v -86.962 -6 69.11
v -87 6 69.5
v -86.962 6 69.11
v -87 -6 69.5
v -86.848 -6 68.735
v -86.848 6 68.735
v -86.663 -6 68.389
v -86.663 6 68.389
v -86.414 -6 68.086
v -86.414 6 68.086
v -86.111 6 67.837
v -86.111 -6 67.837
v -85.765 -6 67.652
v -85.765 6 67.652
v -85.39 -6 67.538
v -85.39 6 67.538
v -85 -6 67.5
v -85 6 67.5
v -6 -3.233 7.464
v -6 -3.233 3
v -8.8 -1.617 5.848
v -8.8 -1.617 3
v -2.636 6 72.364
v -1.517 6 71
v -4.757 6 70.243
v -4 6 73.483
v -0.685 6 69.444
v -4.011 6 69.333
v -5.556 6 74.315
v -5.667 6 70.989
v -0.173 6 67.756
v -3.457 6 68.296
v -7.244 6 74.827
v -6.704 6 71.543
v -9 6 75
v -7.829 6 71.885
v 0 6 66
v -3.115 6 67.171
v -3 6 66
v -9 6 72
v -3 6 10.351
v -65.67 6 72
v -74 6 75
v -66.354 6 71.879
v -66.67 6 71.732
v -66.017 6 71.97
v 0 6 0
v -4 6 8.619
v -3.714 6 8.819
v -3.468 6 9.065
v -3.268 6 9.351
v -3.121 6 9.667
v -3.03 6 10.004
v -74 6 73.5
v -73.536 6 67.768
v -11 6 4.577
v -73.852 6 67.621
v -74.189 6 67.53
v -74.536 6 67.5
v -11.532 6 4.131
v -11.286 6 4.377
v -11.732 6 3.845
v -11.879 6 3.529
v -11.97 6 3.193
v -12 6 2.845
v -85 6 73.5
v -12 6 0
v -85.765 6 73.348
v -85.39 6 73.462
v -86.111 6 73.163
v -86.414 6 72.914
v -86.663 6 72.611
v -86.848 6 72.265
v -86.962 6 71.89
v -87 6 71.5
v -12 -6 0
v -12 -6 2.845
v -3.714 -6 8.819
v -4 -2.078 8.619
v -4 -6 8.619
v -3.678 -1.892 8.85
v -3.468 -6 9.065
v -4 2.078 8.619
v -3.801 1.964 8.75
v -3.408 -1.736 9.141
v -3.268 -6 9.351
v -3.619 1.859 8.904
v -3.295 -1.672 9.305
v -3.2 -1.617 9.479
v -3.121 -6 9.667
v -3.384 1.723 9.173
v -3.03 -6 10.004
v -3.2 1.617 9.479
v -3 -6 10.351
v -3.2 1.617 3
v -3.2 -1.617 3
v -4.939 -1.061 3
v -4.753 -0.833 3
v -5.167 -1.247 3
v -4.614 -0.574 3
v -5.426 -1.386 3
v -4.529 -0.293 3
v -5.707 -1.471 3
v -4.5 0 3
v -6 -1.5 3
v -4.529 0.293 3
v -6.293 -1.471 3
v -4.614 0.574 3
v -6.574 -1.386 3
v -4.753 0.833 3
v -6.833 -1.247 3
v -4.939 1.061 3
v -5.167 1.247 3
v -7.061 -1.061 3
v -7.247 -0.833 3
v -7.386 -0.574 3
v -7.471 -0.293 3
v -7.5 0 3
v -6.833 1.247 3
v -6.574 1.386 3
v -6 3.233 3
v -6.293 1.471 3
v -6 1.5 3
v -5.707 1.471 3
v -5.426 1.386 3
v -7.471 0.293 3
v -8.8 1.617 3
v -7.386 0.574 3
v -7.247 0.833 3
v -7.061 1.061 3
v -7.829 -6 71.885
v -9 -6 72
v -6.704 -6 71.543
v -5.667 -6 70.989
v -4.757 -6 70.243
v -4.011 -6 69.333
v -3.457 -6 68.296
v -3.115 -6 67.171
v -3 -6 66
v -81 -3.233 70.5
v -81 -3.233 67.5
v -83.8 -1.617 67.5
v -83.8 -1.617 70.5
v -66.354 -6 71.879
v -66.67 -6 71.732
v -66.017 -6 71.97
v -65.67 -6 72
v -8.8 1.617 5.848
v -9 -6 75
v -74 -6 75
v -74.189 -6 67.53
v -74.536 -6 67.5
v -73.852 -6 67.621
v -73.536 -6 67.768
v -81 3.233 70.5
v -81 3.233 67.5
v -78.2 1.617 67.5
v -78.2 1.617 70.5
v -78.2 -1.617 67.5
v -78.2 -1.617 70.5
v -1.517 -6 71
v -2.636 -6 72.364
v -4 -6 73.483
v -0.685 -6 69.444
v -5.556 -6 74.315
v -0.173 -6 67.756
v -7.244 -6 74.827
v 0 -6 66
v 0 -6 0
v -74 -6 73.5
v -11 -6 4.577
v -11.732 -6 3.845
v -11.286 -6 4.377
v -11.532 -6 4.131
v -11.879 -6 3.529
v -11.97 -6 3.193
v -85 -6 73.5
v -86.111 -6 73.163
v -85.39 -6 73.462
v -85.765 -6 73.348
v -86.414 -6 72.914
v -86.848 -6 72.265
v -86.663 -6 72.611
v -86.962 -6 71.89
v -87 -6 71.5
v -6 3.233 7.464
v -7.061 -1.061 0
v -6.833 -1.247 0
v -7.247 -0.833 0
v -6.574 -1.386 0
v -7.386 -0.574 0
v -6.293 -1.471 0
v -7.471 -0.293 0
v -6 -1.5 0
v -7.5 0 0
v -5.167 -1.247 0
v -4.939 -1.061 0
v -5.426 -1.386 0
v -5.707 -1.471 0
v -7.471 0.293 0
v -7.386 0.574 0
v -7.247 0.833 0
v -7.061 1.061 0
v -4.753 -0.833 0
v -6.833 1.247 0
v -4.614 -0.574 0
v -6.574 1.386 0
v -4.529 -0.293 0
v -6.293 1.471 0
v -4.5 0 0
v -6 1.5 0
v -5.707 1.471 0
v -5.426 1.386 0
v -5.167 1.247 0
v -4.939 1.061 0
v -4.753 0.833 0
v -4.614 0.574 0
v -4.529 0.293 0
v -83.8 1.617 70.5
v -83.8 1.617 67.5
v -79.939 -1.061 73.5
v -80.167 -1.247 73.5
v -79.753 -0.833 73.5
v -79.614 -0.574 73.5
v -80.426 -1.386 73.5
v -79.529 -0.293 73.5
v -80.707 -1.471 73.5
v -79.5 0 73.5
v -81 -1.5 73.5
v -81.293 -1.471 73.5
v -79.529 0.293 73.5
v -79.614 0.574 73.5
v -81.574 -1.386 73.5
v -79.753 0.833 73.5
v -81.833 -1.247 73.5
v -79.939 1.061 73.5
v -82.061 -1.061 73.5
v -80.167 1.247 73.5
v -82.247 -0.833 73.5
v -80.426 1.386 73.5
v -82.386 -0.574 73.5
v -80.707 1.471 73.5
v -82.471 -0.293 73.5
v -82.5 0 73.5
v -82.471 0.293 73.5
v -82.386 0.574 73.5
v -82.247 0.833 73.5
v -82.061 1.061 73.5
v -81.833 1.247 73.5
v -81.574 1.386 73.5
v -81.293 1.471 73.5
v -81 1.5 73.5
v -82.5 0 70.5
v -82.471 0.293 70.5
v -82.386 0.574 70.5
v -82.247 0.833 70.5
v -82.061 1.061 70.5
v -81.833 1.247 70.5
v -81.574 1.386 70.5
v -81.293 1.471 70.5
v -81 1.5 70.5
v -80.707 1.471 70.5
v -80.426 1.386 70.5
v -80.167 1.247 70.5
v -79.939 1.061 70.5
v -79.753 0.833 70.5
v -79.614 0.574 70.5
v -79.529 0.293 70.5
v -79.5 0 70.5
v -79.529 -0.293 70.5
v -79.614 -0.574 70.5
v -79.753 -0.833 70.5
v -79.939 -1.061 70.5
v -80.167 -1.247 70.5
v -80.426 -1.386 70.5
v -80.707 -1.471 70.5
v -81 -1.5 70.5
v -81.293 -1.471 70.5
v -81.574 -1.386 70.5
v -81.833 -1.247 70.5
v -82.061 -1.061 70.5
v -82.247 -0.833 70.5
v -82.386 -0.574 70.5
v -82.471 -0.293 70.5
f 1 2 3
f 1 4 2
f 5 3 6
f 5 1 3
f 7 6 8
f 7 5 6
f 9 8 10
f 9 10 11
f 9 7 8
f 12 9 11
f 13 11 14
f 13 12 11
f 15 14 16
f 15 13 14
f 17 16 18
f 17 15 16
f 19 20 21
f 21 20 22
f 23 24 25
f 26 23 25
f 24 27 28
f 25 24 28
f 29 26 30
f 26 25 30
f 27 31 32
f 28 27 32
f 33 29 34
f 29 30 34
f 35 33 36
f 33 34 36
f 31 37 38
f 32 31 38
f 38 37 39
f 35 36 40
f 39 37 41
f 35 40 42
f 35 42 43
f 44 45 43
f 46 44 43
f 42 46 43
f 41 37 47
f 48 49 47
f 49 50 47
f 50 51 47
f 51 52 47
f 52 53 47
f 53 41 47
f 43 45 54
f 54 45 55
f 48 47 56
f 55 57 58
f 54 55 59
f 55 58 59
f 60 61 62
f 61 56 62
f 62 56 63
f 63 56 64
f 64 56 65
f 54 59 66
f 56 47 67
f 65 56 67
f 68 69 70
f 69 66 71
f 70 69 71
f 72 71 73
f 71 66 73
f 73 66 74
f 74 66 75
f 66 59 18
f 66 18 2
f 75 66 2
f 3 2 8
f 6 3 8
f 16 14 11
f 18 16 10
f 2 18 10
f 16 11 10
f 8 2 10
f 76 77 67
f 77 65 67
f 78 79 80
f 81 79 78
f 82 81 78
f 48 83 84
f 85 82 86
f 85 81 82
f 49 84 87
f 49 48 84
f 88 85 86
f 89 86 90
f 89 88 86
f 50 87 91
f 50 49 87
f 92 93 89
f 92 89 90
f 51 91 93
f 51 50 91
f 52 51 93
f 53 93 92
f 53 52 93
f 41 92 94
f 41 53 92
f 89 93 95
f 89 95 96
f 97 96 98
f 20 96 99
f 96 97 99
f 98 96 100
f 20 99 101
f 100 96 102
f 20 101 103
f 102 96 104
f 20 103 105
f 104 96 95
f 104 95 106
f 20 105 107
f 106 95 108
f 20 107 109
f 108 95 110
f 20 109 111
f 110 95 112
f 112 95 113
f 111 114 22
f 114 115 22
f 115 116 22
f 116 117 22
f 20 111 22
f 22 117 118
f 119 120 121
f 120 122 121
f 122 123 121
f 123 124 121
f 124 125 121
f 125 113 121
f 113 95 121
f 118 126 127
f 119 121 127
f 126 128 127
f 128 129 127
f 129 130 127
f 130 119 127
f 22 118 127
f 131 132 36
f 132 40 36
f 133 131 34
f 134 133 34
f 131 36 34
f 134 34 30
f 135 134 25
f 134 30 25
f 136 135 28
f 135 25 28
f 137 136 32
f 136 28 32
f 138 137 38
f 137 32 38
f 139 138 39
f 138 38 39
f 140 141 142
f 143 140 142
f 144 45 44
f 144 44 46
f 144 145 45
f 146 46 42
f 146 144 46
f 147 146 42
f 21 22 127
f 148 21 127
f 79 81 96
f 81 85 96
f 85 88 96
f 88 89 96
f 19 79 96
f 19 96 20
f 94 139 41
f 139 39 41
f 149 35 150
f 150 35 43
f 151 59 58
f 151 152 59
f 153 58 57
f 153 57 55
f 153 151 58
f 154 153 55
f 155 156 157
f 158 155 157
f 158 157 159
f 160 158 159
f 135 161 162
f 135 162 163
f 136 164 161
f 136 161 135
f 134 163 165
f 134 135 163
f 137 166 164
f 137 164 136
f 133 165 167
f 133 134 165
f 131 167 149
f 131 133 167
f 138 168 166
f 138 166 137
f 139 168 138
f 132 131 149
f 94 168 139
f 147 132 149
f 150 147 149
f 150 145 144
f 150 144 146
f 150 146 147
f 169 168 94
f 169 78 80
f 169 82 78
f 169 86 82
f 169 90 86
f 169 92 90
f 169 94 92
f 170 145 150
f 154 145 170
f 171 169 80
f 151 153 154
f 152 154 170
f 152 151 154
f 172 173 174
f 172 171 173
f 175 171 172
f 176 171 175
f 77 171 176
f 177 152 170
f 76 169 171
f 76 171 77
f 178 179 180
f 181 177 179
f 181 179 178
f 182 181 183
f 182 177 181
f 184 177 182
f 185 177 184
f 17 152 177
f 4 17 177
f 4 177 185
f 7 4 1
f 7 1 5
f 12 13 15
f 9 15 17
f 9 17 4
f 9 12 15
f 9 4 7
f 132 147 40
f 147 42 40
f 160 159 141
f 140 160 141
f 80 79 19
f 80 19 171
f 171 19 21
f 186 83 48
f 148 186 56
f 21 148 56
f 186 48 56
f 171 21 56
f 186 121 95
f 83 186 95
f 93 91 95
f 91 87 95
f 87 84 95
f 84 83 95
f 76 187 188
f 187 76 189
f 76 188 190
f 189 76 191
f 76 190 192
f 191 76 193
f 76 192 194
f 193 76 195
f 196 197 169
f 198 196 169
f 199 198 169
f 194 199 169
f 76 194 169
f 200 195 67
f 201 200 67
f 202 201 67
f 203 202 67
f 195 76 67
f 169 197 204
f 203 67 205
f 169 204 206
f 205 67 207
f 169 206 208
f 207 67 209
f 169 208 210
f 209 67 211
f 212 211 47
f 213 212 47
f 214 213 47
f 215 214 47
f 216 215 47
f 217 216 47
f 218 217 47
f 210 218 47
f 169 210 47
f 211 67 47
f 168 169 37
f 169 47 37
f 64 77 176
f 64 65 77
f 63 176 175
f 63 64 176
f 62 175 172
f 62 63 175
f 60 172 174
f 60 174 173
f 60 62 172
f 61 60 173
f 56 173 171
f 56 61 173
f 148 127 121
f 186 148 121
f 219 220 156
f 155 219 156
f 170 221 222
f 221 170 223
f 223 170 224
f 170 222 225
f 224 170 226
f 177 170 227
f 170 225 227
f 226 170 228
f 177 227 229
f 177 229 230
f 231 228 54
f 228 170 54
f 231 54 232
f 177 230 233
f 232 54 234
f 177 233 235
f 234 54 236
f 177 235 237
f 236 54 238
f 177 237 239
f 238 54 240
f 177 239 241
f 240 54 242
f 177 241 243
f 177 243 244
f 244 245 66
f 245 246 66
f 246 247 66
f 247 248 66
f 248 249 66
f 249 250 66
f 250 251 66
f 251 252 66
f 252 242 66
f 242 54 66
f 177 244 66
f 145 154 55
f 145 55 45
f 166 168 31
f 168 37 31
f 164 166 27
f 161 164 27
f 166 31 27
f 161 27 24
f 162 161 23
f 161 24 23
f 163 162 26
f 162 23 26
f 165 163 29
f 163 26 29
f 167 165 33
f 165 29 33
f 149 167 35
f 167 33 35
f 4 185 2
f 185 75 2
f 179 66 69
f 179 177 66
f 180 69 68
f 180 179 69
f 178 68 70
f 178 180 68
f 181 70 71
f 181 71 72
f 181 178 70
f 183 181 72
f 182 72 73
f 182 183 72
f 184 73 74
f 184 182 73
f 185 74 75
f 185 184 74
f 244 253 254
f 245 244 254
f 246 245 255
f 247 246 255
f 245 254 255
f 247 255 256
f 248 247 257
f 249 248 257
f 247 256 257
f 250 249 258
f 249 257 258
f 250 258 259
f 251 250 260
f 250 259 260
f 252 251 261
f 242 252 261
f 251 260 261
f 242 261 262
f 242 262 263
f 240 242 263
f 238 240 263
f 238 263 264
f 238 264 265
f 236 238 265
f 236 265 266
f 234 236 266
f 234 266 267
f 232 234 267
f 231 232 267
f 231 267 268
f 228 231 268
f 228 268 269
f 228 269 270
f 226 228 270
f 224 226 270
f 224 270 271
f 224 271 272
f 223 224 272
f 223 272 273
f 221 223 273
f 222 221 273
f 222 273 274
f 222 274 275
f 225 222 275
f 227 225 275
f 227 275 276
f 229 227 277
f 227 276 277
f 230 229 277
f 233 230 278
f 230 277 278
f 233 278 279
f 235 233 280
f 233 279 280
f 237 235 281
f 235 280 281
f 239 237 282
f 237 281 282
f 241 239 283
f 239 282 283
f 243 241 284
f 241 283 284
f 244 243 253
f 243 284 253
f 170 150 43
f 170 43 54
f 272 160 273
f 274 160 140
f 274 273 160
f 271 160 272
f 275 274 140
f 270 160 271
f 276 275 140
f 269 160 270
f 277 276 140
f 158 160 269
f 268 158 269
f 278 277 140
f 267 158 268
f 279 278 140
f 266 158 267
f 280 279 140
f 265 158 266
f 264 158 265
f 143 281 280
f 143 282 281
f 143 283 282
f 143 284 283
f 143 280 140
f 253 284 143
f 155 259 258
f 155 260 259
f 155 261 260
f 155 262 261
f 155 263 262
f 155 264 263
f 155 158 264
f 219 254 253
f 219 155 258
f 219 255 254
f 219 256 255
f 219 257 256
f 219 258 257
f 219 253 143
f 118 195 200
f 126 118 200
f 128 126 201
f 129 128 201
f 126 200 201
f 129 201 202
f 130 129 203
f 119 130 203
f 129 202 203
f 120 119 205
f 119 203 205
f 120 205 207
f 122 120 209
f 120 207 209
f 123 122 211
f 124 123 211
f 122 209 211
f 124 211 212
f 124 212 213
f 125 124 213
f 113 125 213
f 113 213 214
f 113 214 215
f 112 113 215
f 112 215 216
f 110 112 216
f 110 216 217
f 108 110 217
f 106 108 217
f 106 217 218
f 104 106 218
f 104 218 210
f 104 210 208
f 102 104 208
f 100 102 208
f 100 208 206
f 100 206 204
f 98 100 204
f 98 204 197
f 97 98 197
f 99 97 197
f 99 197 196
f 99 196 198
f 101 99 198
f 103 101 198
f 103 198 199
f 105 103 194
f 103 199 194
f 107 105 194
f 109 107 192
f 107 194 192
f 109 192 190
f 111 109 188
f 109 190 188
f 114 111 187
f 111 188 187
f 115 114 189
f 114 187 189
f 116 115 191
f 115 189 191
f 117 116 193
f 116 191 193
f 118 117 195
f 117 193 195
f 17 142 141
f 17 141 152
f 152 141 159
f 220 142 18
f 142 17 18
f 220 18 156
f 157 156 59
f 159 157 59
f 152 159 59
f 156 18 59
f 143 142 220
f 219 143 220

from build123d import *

# Parameters (mm, degrees)
BOSS_EXTRU_1_DEPTH      = 6
ESQUISSE2_R             = 1.5
ENL_V_MAT_EXTRU_1_DEPTH = 12
ESQUISSE3_R             = 1.5
ENL_V_MAT_EXTRU_2_DEPTH = 12
CONG_1_R                = 2
ENL_V_MAT_EXTRU_3_DEPTH = 3
ENL_V_START             = -3
ENL_V_MAT_EXTRU_4_DEPTH = 10


with BuildPart() as part:
    # Esquisse1 → Boss.-Extru.1 (new, symmetric)
    with BuildSketch(Plane(origin=(0, 0, 0), x_dir=(1, 0, 0), z_dir=(0, 1, 0))):
        with BuildLine():
            Line((-12, 0), (0, 0))
            Line((0, 0), (0, -66))
            ThreePointArc((0, -66), (-2.636038969, -72.363961031), (-9, -75))
            Line((-9, -75), (-74, -75))
            Line((-74, -75), (-74, -73.5))
            Line((-74, -73.5), (-87, -73.5))
            Line((-87, -73.5), (-87, -67.5))
            Line((-87, -67.5), (-74, -67.5))
            Line((-74, -67.5), (-66.205771366, -72))
            Line((-66.205771366, -72), (-9, -72))
            ThreePointArc((-9, -72), (-4.757359313, -70.242640687), (-3, -66))
            Line((-3, -66), (-3, -9.196152423))
            Line((-3, -9.196152423), (-12, -4))
            Line((-12, -4), (-12, 0))
        make_face()
    extrude(amount=BOSS_EXTRU_1_DEPTH, both=True)

    # Esquisse2 → Enlèv. mat.-Extru.1 (cut)
    with BuildSketch(Plane(origin=(0, 0, 0), x_dir=(-1, 0, 0), z_dir=(0, 0, -1))):
        with Locations((6, 0)):
            Circle(ESQUISSE2_R)
    extrude(amount=-ENL_V_MAT_EXTRU_1_DEPTH, mode=Mode.SUBTRACT)

    # Esquisse3 → Enlèv. mat.-Extru.2 (cut)
    with BuildSketch(Plane(origin=(0, 0, 67.5), x_dir=(-1, 0, 0), z_dir=(0, 0, -1))):
        with Locations((81, 0)):
            Circle(ESQUISSE3_R)
    extrude(amount=-ENL_V_MAT_EXTRU_2_DEPTH, mode=Mode.SUBTRACT)

    # Congé1
    cong_1_edges = [part.edges().sort_by_distance(p)[0] for p in [
        (-87, 0, 73.5),
        (-87, 0, 67.5),
        (-74, 0, 67.5),
        (-66.205771366, 0, 72),
        (-3, 0, 9.196152423),
        (-12, 0, 4),
    ]]
    fillet(cong_1_edges, radius=CONG_1_R)

    # Esquisse4 → Enlèv. mat.-Extru.3 (cut)
    with BuildSketch(Plane(origin=(0, 0, 67.5), x_dir=(-1, 0, 0), z_dir=(0, 0, -1))):
        Polygon((83.8, 1.616580754), (81, 3.233161507), (78.2, 1.616580754), (78.2, -1.616580754), (81, -3.233161507), (83.8, -1.616580754), align=None)
    extrude(amount=-ENL_V_MAT_EXTRU_3_DEPTH, mode=Mode.SUBTRACT)

    # Esquisse5 → Enlèv. mat.-Extru.4 (cut)
    with BuildSketch(Plane(origin=(0, 0, 0), x_dir=(-1, 0, 0), z_dir=(0, 0, -1)).offset(ENL_V_START)):
        Polygon((8.8, 1.616580754), (6, 3.233161507), (3.2, 1.616580754), (3.2, -1.616580754), (6, -3.233161507), (8.8, -1.616580754), align=None)
    extrude(amount=-ENL_V_MAT_EXTRU_4_DEPTH, mode=Mode.SUBTRACT)


solid = part.part
